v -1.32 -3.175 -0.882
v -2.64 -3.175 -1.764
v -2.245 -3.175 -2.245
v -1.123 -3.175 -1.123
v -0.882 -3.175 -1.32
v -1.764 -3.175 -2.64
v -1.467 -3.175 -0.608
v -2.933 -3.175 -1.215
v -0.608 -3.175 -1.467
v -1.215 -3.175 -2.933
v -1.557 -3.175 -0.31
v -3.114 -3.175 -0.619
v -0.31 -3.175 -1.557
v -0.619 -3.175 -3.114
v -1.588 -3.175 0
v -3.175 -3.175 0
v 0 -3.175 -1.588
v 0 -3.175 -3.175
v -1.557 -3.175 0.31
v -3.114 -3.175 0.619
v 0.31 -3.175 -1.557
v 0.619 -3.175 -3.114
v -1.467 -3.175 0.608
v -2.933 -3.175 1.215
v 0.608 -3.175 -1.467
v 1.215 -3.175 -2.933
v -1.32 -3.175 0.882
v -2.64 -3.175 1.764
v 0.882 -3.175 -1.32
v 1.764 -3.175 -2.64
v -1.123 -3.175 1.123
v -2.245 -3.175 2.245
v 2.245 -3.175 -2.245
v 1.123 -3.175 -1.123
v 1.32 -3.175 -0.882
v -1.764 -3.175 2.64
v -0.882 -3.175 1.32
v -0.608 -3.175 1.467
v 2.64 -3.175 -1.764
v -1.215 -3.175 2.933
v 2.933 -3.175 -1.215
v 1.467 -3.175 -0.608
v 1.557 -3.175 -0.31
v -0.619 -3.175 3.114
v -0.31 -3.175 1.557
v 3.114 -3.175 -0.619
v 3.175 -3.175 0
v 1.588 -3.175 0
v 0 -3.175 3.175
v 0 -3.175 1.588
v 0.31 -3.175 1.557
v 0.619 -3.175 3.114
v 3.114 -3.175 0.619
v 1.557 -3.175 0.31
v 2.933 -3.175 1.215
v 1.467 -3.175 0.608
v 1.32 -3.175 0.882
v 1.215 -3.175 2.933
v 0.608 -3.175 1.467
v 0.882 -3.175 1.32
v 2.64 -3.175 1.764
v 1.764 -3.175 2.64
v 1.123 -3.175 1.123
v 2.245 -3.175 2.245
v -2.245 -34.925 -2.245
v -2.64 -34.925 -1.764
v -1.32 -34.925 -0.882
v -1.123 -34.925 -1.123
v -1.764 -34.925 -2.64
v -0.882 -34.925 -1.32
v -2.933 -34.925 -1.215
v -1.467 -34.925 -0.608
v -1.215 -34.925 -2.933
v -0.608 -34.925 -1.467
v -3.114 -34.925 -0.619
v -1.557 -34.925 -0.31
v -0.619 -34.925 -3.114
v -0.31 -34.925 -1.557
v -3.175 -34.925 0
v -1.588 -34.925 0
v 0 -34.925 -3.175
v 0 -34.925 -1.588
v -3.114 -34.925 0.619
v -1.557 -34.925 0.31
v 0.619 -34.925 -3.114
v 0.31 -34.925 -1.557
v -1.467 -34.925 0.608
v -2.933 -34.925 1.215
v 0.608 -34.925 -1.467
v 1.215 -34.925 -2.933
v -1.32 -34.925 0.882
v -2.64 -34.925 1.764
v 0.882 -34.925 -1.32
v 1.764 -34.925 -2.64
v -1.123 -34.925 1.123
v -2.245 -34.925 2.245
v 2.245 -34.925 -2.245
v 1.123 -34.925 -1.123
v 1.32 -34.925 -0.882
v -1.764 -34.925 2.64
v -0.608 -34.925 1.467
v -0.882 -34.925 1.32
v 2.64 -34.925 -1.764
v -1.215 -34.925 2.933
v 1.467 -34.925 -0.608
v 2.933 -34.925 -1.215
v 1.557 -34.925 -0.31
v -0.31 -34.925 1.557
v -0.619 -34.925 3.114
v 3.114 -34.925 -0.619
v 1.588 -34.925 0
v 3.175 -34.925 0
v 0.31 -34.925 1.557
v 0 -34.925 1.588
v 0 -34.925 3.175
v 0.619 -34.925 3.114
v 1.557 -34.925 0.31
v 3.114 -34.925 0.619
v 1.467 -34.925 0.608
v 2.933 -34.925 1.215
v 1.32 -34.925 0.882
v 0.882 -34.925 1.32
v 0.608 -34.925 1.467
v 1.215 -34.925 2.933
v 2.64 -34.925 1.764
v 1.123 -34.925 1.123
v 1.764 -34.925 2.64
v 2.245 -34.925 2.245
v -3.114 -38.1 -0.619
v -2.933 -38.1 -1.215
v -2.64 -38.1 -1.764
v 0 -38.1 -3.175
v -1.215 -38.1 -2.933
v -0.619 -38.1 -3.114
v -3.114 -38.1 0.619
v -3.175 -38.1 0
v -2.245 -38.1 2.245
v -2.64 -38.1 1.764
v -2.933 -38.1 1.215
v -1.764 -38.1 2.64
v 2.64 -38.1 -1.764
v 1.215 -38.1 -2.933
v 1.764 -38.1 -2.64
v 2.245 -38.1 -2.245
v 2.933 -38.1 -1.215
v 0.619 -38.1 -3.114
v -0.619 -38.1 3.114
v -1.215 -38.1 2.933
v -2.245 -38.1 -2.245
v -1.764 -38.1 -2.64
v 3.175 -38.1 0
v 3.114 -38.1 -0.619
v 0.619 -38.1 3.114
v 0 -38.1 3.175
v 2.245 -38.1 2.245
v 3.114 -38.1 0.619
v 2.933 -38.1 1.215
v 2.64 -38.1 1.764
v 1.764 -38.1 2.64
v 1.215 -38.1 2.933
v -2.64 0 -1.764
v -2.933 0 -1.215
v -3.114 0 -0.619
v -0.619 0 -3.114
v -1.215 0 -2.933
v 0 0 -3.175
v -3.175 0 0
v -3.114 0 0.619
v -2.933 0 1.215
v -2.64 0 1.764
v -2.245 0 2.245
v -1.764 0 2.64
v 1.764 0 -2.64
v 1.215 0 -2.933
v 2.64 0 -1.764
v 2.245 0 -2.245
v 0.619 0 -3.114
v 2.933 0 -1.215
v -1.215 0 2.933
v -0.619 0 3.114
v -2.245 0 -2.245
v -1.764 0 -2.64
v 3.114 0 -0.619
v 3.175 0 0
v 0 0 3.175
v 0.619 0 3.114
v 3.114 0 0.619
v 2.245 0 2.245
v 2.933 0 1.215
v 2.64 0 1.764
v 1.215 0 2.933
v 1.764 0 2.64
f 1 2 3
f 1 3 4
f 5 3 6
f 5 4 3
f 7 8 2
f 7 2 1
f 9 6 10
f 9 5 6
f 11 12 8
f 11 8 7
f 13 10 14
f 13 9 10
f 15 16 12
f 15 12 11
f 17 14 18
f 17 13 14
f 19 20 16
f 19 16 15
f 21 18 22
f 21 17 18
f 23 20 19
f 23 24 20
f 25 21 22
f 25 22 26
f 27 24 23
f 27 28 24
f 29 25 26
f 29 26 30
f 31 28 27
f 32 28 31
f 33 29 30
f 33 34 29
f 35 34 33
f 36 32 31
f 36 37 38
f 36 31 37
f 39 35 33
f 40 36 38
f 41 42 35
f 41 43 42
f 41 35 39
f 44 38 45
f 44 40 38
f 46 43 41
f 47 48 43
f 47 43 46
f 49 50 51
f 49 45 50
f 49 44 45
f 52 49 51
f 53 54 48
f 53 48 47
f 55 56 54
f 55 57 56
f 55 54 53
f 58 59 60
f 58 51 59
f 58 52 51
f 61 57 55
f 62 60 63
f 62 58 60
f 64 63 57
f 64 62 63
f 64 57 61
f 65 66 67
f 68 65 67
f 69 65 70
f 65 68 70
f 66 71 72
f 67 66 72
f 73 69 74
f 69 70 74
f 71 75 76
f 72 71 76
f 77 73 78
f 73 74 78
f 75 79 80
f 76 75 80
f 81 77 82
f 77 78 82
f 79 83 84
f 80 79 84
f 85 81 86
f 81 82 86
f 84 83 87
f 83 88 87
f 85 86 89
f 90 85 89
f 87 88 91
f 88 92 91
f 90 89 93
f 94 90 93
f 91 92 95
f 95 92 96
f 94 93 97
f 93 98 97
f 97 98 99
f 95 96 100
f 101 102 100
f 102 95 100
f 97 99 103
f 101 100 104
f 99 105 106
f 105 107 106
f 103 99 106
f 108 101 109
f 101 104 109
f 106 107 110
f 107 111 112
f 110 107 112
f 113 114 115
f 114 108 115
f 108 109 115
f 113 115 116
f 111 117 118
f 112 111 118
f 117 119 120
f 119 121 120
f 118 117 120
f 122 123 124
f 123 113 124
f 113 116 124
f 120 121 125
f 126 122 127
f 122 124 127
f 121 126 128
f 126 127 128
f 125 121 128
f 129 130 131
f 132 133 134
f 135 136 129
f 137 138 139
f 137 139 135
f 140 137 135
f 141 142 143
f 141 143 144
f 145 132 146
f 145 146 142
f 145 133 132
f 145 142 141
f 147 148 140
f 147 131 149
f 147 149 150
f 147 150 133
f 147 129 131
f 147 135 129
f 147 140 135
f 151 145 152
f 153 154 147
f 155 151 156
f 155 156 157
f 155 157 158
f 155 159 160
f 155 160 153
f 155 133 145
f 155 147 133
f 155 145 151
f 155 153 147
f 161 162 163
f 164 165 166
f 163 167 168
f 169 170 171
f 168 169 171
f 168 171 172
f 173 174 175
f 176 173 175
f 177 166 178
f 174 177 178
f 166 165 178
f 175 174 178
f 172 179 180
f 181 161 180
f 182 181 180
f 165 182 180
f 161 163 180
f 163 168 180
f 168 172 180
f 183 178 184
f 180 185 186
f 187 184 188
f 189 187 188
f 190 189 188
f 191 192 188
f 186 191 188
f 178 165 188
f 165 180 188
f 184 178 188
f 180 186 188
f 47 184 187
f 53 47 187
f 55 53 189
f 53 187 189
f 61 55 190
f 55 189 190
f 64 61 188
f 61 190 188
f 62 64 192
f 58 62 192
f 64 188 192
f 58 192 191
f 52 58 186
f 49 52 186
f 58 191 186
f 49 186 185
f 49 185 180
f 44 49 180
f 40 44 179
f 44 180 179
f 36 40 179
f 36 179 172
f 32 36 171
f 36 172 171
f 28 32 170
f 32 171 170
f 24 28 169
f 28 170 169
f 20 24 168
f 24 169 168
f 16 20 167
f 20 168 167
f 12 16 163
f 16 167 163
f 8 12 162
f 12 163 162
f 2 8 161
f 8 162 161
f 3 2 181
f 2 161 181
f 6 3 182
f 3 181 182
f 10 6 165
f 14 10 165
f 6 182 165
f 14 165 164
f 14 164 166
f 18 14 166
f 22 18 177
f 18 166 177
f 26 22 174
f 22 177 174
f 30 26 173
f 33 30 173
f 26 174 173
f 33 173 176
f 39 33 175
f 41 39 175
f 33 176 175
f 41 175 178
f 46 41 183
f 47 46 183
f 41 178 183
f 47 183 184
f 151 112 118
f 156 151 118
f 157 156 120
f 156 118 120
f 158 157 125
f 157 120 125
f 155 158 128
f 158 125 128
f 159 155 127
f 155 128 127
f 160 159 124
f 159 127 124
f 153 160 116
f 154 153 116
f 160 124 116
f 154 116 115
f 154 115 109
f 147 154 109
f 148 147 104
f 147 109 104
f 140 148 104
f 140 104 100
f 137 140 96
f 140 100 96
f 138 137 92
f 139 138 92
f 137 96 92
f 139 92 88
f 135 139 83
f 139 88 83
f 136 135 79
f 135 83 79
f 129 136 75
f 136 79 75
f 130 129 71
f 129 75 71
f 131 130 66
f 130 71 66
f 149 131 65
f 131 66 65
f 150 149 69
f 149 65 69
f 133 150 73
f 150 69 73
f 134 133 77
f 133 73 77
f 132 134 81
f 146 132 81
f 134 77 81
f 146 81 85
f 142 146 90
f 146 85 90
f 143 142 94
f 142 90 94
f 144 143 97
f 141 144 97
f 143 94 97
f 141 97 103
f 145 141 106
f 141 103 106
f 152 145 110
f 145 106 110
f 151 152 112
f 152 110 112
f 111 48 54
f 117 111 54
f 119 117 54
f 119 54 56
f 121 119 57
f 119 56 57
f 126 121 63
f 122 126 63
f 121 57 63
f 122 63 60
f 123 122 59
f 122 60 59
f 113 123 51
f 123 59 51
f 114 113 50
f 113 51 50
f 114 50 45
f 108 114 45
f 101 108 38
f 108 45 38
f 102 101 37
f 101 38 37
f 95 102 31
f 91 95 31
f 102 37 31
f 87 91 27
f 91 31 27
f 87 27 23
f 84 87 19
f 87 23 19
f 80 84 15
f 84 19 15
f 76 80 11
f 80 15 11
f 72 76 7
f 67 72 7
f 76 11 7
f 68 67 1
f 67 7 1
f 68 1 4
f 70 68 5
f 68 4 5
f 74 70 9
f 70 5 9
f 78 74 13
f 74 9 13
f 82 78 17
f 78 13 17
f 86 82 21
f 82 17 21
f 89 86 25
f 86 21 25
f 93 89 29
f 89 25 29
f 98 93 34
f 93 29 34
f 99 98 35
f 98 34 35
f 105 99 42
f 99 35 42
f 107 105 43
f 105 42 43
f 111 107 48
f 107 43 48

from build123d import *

# Parameters (mm, degrees)
F0_R     = 3.175
F1_DEPTH = 3.175
F2_R     = 1.5875
F3_DEPTH = 31.75
F4_R     = 3.175
F4_R_2   = 1.5875
F5_DEPTH = 3.175


with BuildPart() as f1:
    # F0 (on Front) → F1 (new body)
    with BuildSketch(Plane.XZ):
        Circle(F0_R)
    extrude(amount=F1_DEPTH)

    # F2 (on face) → F3 (join)
    with BuildSketch(Plane.XZ.offset(3.175)):
        Circle(F2_R)
    extrude(amount=F3_DEPTH)

    # F4 (on face) → F5 (join)
    with BuildSketch(Plane.XZ.offset(34.925)):
        Circle(F4_R)
        Circle(F4_R_2, mode=Mode.SUBTRACT)
        Circle(F4_R_2)
    extrude(amount=F5_DEPTH)


solid = f1.part
